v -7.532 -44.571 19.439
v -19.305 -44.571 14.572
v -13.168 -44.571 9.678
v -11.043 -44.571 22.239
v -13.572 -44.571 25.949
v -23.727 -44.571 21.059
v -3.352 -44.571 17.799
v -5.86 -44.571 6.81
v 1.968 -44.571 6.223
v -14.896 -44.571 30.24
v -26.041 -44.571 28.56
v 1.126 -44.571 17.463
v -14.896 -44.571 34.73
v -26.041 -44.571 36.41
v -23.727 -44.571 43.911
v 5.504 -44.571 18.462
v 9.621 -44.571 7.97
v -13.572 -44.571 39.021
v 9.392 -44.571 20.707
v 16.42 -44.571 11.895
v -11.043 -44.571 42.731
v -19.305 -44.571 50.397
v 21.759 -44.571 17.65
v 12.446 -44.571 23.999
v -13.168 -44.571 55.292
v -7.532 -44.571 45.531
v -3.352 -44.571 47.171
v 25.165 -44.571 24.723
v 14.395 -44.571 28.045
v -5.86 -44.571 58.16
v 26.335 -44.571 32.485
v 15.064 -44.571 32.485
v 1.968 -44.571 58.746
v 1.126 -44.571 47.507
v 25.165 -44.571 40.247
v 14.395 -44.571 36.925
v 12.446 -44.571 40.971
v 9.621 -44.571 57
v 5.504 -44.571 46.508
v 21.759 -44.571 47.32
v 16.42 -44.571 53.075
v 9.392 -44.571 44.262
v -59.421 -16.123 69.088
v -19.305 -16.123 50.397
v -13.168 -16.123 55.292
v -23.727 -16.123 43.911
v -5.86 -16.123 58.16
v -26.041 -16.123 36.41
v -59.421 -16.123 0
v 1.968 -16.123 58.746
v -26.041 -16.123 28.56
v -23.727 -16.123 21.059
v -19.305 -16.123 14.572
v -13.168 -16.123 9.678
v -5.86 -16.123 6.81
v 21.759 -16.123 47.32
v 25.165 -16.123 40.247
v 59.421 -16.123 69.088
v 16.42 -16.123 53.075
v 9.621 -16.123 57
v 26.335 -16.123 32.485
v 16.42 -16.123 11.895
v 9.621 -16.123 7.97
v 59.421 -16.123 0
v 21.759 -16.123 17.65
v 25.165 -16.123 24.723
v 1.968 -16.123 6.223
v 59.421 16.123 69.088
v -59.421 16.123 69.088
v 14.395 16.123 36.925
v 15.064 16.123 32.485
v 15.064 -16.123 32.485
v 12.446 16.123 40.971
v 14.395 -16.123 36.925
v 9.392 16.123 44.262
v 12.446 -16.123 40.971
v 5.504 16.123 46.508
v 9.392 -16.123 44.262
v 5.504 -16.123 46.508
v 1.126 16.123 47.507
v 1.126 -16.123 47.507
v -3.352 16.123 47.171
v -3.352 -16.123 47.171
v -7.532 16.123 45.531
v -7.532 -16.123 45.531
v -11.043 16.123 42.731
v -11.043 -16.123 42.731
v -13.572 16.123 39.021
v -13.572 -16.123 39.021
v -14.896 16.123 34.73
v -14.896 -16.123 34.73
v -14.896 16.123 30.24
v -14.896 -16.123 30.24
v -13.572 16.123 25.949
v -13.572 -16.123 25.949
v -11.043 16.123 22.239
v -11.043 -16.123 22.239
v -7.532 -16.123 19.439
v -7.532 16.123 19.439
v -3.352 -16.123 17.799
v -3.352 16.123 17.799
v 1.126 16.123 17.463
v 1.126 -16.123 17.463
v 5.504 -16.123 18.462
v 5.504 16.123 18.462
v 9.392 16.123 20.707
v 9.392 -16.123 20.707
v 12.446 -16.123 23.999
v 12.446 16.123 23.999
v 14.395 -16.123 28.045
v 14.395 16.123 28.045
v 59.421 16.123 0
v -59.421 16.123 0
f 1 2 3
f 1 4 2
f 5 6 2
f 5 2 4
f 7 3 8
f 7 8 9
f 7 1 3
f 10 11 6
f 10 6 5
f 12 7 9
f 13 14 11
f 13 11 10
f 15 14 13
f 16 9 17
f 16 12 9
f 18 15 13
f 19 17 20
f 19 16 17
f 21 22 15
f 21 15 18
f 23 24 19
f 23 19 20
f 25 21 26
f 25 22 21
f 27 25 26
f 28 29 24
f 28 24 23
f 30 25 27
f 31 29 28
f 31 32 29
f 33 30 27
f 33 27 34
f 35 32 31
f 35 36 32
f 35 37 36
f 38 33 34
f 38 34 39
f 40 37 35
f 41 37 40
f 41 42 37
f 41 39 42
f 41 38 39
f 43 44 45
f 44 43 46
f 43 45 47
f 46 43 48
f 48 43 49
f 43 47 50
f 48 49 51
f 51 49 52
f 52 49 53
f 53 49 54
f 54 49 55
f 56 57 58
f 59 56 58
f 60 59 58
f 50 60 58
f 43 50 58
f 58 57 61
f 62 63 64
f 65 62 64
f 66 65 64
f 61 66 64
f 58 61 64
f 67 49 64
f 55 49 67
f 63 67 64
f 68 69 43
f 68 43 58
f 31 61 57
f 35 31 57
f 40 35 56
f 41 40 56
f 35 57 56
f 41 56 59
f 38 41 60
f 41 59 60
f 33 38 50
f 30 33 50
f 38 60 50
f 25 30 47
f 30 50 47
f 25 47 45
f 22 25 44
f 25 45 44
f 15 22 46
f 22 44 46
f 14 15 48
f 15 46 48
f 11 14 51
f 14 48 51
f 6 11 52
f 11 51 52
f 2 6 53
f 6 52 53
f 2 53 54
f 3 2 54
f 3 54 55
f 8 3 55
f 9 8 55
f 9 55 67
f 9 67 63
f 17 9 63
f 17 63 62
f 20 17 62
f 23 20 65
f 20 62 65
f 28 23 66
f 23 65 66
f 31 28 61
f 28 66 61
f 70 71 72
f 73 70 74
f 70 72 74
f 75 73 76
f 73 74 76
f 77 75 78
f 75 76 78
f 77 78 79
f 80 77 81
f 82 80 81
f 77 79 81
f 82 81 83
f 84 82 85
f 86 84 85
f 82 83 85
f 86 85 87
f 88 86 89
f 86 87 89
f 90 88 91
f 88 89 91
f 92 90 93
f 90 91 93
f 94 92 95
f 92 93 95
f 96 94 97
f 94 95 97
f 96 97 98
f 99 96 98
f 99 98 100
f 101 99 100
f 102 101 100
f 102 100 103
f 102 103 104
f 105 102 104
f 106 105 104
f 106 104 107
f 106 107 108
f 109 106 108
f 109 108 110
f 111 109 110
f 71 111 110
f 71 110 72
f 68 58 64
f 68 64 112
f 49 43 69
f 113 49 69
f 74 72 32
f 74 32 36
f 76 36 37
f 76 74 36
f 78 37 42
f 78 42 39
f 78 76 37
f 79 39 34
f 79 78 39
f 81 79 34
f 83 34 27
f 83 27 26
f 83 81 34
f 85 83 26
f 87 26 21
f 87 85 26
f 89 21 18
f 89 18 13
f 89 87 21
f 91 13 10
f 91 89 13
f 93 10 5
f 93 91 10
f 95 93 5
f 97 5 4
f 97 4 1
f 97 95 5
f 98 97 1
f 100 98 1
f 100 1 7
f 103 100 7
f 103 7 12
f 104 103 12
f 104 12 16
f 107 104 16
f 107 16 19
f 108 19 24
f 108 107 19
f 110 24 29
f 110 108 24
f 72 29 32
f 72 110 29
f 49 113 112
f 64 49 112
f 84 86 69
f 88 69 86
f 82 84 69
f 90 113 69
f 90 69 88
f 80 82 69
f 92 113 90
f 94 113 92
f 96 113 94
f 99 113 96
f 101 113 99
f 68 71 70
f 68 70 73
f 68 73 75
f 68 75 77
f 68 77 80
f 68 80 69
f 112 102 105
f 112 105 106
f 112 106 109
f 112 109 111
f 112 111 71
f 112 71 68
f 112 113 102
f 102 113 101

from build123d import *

# Parameters (mm, degrees)
F0_W     = 118.841722
F0_H     = 32.246224
F1_DEPTH = 69.088
F2_R     = 15.064015
F3_DEPTH = 104.648
F2_R_2   = 26.33517
F4_DEPTH = 28.448


with BuildPart() as f1:
    # F0 (on Top) → F1 (new body)
    with BuildSketch(Plane.XY):
        Rectangle(F0_W, F0_H)
    extrude(amount=F1_DEPTH)

    # F2 (on face) → F3 (cut)
    with BuildSketch(Plane.XZ.offset(16.123112)):
        with Locations((0, 32.48496)):
            Circle(F2_R)
    extrude(amount=-F3_DEPTH, mode=Mode.SUBTRACT)

    # F2 (on face) → F4 (join)
    with BuildSketch(Plane.XZ.offset(16.123112)):
        with Locations((0, 32.48496)):
            Circle(F2_R_2)
        with Locations((0, 32.48496)):
            Circle(F2_R, mode=Mode.SUBTRACT)
    extrude(amount=F4_DEPTH)


solid = f1.part
